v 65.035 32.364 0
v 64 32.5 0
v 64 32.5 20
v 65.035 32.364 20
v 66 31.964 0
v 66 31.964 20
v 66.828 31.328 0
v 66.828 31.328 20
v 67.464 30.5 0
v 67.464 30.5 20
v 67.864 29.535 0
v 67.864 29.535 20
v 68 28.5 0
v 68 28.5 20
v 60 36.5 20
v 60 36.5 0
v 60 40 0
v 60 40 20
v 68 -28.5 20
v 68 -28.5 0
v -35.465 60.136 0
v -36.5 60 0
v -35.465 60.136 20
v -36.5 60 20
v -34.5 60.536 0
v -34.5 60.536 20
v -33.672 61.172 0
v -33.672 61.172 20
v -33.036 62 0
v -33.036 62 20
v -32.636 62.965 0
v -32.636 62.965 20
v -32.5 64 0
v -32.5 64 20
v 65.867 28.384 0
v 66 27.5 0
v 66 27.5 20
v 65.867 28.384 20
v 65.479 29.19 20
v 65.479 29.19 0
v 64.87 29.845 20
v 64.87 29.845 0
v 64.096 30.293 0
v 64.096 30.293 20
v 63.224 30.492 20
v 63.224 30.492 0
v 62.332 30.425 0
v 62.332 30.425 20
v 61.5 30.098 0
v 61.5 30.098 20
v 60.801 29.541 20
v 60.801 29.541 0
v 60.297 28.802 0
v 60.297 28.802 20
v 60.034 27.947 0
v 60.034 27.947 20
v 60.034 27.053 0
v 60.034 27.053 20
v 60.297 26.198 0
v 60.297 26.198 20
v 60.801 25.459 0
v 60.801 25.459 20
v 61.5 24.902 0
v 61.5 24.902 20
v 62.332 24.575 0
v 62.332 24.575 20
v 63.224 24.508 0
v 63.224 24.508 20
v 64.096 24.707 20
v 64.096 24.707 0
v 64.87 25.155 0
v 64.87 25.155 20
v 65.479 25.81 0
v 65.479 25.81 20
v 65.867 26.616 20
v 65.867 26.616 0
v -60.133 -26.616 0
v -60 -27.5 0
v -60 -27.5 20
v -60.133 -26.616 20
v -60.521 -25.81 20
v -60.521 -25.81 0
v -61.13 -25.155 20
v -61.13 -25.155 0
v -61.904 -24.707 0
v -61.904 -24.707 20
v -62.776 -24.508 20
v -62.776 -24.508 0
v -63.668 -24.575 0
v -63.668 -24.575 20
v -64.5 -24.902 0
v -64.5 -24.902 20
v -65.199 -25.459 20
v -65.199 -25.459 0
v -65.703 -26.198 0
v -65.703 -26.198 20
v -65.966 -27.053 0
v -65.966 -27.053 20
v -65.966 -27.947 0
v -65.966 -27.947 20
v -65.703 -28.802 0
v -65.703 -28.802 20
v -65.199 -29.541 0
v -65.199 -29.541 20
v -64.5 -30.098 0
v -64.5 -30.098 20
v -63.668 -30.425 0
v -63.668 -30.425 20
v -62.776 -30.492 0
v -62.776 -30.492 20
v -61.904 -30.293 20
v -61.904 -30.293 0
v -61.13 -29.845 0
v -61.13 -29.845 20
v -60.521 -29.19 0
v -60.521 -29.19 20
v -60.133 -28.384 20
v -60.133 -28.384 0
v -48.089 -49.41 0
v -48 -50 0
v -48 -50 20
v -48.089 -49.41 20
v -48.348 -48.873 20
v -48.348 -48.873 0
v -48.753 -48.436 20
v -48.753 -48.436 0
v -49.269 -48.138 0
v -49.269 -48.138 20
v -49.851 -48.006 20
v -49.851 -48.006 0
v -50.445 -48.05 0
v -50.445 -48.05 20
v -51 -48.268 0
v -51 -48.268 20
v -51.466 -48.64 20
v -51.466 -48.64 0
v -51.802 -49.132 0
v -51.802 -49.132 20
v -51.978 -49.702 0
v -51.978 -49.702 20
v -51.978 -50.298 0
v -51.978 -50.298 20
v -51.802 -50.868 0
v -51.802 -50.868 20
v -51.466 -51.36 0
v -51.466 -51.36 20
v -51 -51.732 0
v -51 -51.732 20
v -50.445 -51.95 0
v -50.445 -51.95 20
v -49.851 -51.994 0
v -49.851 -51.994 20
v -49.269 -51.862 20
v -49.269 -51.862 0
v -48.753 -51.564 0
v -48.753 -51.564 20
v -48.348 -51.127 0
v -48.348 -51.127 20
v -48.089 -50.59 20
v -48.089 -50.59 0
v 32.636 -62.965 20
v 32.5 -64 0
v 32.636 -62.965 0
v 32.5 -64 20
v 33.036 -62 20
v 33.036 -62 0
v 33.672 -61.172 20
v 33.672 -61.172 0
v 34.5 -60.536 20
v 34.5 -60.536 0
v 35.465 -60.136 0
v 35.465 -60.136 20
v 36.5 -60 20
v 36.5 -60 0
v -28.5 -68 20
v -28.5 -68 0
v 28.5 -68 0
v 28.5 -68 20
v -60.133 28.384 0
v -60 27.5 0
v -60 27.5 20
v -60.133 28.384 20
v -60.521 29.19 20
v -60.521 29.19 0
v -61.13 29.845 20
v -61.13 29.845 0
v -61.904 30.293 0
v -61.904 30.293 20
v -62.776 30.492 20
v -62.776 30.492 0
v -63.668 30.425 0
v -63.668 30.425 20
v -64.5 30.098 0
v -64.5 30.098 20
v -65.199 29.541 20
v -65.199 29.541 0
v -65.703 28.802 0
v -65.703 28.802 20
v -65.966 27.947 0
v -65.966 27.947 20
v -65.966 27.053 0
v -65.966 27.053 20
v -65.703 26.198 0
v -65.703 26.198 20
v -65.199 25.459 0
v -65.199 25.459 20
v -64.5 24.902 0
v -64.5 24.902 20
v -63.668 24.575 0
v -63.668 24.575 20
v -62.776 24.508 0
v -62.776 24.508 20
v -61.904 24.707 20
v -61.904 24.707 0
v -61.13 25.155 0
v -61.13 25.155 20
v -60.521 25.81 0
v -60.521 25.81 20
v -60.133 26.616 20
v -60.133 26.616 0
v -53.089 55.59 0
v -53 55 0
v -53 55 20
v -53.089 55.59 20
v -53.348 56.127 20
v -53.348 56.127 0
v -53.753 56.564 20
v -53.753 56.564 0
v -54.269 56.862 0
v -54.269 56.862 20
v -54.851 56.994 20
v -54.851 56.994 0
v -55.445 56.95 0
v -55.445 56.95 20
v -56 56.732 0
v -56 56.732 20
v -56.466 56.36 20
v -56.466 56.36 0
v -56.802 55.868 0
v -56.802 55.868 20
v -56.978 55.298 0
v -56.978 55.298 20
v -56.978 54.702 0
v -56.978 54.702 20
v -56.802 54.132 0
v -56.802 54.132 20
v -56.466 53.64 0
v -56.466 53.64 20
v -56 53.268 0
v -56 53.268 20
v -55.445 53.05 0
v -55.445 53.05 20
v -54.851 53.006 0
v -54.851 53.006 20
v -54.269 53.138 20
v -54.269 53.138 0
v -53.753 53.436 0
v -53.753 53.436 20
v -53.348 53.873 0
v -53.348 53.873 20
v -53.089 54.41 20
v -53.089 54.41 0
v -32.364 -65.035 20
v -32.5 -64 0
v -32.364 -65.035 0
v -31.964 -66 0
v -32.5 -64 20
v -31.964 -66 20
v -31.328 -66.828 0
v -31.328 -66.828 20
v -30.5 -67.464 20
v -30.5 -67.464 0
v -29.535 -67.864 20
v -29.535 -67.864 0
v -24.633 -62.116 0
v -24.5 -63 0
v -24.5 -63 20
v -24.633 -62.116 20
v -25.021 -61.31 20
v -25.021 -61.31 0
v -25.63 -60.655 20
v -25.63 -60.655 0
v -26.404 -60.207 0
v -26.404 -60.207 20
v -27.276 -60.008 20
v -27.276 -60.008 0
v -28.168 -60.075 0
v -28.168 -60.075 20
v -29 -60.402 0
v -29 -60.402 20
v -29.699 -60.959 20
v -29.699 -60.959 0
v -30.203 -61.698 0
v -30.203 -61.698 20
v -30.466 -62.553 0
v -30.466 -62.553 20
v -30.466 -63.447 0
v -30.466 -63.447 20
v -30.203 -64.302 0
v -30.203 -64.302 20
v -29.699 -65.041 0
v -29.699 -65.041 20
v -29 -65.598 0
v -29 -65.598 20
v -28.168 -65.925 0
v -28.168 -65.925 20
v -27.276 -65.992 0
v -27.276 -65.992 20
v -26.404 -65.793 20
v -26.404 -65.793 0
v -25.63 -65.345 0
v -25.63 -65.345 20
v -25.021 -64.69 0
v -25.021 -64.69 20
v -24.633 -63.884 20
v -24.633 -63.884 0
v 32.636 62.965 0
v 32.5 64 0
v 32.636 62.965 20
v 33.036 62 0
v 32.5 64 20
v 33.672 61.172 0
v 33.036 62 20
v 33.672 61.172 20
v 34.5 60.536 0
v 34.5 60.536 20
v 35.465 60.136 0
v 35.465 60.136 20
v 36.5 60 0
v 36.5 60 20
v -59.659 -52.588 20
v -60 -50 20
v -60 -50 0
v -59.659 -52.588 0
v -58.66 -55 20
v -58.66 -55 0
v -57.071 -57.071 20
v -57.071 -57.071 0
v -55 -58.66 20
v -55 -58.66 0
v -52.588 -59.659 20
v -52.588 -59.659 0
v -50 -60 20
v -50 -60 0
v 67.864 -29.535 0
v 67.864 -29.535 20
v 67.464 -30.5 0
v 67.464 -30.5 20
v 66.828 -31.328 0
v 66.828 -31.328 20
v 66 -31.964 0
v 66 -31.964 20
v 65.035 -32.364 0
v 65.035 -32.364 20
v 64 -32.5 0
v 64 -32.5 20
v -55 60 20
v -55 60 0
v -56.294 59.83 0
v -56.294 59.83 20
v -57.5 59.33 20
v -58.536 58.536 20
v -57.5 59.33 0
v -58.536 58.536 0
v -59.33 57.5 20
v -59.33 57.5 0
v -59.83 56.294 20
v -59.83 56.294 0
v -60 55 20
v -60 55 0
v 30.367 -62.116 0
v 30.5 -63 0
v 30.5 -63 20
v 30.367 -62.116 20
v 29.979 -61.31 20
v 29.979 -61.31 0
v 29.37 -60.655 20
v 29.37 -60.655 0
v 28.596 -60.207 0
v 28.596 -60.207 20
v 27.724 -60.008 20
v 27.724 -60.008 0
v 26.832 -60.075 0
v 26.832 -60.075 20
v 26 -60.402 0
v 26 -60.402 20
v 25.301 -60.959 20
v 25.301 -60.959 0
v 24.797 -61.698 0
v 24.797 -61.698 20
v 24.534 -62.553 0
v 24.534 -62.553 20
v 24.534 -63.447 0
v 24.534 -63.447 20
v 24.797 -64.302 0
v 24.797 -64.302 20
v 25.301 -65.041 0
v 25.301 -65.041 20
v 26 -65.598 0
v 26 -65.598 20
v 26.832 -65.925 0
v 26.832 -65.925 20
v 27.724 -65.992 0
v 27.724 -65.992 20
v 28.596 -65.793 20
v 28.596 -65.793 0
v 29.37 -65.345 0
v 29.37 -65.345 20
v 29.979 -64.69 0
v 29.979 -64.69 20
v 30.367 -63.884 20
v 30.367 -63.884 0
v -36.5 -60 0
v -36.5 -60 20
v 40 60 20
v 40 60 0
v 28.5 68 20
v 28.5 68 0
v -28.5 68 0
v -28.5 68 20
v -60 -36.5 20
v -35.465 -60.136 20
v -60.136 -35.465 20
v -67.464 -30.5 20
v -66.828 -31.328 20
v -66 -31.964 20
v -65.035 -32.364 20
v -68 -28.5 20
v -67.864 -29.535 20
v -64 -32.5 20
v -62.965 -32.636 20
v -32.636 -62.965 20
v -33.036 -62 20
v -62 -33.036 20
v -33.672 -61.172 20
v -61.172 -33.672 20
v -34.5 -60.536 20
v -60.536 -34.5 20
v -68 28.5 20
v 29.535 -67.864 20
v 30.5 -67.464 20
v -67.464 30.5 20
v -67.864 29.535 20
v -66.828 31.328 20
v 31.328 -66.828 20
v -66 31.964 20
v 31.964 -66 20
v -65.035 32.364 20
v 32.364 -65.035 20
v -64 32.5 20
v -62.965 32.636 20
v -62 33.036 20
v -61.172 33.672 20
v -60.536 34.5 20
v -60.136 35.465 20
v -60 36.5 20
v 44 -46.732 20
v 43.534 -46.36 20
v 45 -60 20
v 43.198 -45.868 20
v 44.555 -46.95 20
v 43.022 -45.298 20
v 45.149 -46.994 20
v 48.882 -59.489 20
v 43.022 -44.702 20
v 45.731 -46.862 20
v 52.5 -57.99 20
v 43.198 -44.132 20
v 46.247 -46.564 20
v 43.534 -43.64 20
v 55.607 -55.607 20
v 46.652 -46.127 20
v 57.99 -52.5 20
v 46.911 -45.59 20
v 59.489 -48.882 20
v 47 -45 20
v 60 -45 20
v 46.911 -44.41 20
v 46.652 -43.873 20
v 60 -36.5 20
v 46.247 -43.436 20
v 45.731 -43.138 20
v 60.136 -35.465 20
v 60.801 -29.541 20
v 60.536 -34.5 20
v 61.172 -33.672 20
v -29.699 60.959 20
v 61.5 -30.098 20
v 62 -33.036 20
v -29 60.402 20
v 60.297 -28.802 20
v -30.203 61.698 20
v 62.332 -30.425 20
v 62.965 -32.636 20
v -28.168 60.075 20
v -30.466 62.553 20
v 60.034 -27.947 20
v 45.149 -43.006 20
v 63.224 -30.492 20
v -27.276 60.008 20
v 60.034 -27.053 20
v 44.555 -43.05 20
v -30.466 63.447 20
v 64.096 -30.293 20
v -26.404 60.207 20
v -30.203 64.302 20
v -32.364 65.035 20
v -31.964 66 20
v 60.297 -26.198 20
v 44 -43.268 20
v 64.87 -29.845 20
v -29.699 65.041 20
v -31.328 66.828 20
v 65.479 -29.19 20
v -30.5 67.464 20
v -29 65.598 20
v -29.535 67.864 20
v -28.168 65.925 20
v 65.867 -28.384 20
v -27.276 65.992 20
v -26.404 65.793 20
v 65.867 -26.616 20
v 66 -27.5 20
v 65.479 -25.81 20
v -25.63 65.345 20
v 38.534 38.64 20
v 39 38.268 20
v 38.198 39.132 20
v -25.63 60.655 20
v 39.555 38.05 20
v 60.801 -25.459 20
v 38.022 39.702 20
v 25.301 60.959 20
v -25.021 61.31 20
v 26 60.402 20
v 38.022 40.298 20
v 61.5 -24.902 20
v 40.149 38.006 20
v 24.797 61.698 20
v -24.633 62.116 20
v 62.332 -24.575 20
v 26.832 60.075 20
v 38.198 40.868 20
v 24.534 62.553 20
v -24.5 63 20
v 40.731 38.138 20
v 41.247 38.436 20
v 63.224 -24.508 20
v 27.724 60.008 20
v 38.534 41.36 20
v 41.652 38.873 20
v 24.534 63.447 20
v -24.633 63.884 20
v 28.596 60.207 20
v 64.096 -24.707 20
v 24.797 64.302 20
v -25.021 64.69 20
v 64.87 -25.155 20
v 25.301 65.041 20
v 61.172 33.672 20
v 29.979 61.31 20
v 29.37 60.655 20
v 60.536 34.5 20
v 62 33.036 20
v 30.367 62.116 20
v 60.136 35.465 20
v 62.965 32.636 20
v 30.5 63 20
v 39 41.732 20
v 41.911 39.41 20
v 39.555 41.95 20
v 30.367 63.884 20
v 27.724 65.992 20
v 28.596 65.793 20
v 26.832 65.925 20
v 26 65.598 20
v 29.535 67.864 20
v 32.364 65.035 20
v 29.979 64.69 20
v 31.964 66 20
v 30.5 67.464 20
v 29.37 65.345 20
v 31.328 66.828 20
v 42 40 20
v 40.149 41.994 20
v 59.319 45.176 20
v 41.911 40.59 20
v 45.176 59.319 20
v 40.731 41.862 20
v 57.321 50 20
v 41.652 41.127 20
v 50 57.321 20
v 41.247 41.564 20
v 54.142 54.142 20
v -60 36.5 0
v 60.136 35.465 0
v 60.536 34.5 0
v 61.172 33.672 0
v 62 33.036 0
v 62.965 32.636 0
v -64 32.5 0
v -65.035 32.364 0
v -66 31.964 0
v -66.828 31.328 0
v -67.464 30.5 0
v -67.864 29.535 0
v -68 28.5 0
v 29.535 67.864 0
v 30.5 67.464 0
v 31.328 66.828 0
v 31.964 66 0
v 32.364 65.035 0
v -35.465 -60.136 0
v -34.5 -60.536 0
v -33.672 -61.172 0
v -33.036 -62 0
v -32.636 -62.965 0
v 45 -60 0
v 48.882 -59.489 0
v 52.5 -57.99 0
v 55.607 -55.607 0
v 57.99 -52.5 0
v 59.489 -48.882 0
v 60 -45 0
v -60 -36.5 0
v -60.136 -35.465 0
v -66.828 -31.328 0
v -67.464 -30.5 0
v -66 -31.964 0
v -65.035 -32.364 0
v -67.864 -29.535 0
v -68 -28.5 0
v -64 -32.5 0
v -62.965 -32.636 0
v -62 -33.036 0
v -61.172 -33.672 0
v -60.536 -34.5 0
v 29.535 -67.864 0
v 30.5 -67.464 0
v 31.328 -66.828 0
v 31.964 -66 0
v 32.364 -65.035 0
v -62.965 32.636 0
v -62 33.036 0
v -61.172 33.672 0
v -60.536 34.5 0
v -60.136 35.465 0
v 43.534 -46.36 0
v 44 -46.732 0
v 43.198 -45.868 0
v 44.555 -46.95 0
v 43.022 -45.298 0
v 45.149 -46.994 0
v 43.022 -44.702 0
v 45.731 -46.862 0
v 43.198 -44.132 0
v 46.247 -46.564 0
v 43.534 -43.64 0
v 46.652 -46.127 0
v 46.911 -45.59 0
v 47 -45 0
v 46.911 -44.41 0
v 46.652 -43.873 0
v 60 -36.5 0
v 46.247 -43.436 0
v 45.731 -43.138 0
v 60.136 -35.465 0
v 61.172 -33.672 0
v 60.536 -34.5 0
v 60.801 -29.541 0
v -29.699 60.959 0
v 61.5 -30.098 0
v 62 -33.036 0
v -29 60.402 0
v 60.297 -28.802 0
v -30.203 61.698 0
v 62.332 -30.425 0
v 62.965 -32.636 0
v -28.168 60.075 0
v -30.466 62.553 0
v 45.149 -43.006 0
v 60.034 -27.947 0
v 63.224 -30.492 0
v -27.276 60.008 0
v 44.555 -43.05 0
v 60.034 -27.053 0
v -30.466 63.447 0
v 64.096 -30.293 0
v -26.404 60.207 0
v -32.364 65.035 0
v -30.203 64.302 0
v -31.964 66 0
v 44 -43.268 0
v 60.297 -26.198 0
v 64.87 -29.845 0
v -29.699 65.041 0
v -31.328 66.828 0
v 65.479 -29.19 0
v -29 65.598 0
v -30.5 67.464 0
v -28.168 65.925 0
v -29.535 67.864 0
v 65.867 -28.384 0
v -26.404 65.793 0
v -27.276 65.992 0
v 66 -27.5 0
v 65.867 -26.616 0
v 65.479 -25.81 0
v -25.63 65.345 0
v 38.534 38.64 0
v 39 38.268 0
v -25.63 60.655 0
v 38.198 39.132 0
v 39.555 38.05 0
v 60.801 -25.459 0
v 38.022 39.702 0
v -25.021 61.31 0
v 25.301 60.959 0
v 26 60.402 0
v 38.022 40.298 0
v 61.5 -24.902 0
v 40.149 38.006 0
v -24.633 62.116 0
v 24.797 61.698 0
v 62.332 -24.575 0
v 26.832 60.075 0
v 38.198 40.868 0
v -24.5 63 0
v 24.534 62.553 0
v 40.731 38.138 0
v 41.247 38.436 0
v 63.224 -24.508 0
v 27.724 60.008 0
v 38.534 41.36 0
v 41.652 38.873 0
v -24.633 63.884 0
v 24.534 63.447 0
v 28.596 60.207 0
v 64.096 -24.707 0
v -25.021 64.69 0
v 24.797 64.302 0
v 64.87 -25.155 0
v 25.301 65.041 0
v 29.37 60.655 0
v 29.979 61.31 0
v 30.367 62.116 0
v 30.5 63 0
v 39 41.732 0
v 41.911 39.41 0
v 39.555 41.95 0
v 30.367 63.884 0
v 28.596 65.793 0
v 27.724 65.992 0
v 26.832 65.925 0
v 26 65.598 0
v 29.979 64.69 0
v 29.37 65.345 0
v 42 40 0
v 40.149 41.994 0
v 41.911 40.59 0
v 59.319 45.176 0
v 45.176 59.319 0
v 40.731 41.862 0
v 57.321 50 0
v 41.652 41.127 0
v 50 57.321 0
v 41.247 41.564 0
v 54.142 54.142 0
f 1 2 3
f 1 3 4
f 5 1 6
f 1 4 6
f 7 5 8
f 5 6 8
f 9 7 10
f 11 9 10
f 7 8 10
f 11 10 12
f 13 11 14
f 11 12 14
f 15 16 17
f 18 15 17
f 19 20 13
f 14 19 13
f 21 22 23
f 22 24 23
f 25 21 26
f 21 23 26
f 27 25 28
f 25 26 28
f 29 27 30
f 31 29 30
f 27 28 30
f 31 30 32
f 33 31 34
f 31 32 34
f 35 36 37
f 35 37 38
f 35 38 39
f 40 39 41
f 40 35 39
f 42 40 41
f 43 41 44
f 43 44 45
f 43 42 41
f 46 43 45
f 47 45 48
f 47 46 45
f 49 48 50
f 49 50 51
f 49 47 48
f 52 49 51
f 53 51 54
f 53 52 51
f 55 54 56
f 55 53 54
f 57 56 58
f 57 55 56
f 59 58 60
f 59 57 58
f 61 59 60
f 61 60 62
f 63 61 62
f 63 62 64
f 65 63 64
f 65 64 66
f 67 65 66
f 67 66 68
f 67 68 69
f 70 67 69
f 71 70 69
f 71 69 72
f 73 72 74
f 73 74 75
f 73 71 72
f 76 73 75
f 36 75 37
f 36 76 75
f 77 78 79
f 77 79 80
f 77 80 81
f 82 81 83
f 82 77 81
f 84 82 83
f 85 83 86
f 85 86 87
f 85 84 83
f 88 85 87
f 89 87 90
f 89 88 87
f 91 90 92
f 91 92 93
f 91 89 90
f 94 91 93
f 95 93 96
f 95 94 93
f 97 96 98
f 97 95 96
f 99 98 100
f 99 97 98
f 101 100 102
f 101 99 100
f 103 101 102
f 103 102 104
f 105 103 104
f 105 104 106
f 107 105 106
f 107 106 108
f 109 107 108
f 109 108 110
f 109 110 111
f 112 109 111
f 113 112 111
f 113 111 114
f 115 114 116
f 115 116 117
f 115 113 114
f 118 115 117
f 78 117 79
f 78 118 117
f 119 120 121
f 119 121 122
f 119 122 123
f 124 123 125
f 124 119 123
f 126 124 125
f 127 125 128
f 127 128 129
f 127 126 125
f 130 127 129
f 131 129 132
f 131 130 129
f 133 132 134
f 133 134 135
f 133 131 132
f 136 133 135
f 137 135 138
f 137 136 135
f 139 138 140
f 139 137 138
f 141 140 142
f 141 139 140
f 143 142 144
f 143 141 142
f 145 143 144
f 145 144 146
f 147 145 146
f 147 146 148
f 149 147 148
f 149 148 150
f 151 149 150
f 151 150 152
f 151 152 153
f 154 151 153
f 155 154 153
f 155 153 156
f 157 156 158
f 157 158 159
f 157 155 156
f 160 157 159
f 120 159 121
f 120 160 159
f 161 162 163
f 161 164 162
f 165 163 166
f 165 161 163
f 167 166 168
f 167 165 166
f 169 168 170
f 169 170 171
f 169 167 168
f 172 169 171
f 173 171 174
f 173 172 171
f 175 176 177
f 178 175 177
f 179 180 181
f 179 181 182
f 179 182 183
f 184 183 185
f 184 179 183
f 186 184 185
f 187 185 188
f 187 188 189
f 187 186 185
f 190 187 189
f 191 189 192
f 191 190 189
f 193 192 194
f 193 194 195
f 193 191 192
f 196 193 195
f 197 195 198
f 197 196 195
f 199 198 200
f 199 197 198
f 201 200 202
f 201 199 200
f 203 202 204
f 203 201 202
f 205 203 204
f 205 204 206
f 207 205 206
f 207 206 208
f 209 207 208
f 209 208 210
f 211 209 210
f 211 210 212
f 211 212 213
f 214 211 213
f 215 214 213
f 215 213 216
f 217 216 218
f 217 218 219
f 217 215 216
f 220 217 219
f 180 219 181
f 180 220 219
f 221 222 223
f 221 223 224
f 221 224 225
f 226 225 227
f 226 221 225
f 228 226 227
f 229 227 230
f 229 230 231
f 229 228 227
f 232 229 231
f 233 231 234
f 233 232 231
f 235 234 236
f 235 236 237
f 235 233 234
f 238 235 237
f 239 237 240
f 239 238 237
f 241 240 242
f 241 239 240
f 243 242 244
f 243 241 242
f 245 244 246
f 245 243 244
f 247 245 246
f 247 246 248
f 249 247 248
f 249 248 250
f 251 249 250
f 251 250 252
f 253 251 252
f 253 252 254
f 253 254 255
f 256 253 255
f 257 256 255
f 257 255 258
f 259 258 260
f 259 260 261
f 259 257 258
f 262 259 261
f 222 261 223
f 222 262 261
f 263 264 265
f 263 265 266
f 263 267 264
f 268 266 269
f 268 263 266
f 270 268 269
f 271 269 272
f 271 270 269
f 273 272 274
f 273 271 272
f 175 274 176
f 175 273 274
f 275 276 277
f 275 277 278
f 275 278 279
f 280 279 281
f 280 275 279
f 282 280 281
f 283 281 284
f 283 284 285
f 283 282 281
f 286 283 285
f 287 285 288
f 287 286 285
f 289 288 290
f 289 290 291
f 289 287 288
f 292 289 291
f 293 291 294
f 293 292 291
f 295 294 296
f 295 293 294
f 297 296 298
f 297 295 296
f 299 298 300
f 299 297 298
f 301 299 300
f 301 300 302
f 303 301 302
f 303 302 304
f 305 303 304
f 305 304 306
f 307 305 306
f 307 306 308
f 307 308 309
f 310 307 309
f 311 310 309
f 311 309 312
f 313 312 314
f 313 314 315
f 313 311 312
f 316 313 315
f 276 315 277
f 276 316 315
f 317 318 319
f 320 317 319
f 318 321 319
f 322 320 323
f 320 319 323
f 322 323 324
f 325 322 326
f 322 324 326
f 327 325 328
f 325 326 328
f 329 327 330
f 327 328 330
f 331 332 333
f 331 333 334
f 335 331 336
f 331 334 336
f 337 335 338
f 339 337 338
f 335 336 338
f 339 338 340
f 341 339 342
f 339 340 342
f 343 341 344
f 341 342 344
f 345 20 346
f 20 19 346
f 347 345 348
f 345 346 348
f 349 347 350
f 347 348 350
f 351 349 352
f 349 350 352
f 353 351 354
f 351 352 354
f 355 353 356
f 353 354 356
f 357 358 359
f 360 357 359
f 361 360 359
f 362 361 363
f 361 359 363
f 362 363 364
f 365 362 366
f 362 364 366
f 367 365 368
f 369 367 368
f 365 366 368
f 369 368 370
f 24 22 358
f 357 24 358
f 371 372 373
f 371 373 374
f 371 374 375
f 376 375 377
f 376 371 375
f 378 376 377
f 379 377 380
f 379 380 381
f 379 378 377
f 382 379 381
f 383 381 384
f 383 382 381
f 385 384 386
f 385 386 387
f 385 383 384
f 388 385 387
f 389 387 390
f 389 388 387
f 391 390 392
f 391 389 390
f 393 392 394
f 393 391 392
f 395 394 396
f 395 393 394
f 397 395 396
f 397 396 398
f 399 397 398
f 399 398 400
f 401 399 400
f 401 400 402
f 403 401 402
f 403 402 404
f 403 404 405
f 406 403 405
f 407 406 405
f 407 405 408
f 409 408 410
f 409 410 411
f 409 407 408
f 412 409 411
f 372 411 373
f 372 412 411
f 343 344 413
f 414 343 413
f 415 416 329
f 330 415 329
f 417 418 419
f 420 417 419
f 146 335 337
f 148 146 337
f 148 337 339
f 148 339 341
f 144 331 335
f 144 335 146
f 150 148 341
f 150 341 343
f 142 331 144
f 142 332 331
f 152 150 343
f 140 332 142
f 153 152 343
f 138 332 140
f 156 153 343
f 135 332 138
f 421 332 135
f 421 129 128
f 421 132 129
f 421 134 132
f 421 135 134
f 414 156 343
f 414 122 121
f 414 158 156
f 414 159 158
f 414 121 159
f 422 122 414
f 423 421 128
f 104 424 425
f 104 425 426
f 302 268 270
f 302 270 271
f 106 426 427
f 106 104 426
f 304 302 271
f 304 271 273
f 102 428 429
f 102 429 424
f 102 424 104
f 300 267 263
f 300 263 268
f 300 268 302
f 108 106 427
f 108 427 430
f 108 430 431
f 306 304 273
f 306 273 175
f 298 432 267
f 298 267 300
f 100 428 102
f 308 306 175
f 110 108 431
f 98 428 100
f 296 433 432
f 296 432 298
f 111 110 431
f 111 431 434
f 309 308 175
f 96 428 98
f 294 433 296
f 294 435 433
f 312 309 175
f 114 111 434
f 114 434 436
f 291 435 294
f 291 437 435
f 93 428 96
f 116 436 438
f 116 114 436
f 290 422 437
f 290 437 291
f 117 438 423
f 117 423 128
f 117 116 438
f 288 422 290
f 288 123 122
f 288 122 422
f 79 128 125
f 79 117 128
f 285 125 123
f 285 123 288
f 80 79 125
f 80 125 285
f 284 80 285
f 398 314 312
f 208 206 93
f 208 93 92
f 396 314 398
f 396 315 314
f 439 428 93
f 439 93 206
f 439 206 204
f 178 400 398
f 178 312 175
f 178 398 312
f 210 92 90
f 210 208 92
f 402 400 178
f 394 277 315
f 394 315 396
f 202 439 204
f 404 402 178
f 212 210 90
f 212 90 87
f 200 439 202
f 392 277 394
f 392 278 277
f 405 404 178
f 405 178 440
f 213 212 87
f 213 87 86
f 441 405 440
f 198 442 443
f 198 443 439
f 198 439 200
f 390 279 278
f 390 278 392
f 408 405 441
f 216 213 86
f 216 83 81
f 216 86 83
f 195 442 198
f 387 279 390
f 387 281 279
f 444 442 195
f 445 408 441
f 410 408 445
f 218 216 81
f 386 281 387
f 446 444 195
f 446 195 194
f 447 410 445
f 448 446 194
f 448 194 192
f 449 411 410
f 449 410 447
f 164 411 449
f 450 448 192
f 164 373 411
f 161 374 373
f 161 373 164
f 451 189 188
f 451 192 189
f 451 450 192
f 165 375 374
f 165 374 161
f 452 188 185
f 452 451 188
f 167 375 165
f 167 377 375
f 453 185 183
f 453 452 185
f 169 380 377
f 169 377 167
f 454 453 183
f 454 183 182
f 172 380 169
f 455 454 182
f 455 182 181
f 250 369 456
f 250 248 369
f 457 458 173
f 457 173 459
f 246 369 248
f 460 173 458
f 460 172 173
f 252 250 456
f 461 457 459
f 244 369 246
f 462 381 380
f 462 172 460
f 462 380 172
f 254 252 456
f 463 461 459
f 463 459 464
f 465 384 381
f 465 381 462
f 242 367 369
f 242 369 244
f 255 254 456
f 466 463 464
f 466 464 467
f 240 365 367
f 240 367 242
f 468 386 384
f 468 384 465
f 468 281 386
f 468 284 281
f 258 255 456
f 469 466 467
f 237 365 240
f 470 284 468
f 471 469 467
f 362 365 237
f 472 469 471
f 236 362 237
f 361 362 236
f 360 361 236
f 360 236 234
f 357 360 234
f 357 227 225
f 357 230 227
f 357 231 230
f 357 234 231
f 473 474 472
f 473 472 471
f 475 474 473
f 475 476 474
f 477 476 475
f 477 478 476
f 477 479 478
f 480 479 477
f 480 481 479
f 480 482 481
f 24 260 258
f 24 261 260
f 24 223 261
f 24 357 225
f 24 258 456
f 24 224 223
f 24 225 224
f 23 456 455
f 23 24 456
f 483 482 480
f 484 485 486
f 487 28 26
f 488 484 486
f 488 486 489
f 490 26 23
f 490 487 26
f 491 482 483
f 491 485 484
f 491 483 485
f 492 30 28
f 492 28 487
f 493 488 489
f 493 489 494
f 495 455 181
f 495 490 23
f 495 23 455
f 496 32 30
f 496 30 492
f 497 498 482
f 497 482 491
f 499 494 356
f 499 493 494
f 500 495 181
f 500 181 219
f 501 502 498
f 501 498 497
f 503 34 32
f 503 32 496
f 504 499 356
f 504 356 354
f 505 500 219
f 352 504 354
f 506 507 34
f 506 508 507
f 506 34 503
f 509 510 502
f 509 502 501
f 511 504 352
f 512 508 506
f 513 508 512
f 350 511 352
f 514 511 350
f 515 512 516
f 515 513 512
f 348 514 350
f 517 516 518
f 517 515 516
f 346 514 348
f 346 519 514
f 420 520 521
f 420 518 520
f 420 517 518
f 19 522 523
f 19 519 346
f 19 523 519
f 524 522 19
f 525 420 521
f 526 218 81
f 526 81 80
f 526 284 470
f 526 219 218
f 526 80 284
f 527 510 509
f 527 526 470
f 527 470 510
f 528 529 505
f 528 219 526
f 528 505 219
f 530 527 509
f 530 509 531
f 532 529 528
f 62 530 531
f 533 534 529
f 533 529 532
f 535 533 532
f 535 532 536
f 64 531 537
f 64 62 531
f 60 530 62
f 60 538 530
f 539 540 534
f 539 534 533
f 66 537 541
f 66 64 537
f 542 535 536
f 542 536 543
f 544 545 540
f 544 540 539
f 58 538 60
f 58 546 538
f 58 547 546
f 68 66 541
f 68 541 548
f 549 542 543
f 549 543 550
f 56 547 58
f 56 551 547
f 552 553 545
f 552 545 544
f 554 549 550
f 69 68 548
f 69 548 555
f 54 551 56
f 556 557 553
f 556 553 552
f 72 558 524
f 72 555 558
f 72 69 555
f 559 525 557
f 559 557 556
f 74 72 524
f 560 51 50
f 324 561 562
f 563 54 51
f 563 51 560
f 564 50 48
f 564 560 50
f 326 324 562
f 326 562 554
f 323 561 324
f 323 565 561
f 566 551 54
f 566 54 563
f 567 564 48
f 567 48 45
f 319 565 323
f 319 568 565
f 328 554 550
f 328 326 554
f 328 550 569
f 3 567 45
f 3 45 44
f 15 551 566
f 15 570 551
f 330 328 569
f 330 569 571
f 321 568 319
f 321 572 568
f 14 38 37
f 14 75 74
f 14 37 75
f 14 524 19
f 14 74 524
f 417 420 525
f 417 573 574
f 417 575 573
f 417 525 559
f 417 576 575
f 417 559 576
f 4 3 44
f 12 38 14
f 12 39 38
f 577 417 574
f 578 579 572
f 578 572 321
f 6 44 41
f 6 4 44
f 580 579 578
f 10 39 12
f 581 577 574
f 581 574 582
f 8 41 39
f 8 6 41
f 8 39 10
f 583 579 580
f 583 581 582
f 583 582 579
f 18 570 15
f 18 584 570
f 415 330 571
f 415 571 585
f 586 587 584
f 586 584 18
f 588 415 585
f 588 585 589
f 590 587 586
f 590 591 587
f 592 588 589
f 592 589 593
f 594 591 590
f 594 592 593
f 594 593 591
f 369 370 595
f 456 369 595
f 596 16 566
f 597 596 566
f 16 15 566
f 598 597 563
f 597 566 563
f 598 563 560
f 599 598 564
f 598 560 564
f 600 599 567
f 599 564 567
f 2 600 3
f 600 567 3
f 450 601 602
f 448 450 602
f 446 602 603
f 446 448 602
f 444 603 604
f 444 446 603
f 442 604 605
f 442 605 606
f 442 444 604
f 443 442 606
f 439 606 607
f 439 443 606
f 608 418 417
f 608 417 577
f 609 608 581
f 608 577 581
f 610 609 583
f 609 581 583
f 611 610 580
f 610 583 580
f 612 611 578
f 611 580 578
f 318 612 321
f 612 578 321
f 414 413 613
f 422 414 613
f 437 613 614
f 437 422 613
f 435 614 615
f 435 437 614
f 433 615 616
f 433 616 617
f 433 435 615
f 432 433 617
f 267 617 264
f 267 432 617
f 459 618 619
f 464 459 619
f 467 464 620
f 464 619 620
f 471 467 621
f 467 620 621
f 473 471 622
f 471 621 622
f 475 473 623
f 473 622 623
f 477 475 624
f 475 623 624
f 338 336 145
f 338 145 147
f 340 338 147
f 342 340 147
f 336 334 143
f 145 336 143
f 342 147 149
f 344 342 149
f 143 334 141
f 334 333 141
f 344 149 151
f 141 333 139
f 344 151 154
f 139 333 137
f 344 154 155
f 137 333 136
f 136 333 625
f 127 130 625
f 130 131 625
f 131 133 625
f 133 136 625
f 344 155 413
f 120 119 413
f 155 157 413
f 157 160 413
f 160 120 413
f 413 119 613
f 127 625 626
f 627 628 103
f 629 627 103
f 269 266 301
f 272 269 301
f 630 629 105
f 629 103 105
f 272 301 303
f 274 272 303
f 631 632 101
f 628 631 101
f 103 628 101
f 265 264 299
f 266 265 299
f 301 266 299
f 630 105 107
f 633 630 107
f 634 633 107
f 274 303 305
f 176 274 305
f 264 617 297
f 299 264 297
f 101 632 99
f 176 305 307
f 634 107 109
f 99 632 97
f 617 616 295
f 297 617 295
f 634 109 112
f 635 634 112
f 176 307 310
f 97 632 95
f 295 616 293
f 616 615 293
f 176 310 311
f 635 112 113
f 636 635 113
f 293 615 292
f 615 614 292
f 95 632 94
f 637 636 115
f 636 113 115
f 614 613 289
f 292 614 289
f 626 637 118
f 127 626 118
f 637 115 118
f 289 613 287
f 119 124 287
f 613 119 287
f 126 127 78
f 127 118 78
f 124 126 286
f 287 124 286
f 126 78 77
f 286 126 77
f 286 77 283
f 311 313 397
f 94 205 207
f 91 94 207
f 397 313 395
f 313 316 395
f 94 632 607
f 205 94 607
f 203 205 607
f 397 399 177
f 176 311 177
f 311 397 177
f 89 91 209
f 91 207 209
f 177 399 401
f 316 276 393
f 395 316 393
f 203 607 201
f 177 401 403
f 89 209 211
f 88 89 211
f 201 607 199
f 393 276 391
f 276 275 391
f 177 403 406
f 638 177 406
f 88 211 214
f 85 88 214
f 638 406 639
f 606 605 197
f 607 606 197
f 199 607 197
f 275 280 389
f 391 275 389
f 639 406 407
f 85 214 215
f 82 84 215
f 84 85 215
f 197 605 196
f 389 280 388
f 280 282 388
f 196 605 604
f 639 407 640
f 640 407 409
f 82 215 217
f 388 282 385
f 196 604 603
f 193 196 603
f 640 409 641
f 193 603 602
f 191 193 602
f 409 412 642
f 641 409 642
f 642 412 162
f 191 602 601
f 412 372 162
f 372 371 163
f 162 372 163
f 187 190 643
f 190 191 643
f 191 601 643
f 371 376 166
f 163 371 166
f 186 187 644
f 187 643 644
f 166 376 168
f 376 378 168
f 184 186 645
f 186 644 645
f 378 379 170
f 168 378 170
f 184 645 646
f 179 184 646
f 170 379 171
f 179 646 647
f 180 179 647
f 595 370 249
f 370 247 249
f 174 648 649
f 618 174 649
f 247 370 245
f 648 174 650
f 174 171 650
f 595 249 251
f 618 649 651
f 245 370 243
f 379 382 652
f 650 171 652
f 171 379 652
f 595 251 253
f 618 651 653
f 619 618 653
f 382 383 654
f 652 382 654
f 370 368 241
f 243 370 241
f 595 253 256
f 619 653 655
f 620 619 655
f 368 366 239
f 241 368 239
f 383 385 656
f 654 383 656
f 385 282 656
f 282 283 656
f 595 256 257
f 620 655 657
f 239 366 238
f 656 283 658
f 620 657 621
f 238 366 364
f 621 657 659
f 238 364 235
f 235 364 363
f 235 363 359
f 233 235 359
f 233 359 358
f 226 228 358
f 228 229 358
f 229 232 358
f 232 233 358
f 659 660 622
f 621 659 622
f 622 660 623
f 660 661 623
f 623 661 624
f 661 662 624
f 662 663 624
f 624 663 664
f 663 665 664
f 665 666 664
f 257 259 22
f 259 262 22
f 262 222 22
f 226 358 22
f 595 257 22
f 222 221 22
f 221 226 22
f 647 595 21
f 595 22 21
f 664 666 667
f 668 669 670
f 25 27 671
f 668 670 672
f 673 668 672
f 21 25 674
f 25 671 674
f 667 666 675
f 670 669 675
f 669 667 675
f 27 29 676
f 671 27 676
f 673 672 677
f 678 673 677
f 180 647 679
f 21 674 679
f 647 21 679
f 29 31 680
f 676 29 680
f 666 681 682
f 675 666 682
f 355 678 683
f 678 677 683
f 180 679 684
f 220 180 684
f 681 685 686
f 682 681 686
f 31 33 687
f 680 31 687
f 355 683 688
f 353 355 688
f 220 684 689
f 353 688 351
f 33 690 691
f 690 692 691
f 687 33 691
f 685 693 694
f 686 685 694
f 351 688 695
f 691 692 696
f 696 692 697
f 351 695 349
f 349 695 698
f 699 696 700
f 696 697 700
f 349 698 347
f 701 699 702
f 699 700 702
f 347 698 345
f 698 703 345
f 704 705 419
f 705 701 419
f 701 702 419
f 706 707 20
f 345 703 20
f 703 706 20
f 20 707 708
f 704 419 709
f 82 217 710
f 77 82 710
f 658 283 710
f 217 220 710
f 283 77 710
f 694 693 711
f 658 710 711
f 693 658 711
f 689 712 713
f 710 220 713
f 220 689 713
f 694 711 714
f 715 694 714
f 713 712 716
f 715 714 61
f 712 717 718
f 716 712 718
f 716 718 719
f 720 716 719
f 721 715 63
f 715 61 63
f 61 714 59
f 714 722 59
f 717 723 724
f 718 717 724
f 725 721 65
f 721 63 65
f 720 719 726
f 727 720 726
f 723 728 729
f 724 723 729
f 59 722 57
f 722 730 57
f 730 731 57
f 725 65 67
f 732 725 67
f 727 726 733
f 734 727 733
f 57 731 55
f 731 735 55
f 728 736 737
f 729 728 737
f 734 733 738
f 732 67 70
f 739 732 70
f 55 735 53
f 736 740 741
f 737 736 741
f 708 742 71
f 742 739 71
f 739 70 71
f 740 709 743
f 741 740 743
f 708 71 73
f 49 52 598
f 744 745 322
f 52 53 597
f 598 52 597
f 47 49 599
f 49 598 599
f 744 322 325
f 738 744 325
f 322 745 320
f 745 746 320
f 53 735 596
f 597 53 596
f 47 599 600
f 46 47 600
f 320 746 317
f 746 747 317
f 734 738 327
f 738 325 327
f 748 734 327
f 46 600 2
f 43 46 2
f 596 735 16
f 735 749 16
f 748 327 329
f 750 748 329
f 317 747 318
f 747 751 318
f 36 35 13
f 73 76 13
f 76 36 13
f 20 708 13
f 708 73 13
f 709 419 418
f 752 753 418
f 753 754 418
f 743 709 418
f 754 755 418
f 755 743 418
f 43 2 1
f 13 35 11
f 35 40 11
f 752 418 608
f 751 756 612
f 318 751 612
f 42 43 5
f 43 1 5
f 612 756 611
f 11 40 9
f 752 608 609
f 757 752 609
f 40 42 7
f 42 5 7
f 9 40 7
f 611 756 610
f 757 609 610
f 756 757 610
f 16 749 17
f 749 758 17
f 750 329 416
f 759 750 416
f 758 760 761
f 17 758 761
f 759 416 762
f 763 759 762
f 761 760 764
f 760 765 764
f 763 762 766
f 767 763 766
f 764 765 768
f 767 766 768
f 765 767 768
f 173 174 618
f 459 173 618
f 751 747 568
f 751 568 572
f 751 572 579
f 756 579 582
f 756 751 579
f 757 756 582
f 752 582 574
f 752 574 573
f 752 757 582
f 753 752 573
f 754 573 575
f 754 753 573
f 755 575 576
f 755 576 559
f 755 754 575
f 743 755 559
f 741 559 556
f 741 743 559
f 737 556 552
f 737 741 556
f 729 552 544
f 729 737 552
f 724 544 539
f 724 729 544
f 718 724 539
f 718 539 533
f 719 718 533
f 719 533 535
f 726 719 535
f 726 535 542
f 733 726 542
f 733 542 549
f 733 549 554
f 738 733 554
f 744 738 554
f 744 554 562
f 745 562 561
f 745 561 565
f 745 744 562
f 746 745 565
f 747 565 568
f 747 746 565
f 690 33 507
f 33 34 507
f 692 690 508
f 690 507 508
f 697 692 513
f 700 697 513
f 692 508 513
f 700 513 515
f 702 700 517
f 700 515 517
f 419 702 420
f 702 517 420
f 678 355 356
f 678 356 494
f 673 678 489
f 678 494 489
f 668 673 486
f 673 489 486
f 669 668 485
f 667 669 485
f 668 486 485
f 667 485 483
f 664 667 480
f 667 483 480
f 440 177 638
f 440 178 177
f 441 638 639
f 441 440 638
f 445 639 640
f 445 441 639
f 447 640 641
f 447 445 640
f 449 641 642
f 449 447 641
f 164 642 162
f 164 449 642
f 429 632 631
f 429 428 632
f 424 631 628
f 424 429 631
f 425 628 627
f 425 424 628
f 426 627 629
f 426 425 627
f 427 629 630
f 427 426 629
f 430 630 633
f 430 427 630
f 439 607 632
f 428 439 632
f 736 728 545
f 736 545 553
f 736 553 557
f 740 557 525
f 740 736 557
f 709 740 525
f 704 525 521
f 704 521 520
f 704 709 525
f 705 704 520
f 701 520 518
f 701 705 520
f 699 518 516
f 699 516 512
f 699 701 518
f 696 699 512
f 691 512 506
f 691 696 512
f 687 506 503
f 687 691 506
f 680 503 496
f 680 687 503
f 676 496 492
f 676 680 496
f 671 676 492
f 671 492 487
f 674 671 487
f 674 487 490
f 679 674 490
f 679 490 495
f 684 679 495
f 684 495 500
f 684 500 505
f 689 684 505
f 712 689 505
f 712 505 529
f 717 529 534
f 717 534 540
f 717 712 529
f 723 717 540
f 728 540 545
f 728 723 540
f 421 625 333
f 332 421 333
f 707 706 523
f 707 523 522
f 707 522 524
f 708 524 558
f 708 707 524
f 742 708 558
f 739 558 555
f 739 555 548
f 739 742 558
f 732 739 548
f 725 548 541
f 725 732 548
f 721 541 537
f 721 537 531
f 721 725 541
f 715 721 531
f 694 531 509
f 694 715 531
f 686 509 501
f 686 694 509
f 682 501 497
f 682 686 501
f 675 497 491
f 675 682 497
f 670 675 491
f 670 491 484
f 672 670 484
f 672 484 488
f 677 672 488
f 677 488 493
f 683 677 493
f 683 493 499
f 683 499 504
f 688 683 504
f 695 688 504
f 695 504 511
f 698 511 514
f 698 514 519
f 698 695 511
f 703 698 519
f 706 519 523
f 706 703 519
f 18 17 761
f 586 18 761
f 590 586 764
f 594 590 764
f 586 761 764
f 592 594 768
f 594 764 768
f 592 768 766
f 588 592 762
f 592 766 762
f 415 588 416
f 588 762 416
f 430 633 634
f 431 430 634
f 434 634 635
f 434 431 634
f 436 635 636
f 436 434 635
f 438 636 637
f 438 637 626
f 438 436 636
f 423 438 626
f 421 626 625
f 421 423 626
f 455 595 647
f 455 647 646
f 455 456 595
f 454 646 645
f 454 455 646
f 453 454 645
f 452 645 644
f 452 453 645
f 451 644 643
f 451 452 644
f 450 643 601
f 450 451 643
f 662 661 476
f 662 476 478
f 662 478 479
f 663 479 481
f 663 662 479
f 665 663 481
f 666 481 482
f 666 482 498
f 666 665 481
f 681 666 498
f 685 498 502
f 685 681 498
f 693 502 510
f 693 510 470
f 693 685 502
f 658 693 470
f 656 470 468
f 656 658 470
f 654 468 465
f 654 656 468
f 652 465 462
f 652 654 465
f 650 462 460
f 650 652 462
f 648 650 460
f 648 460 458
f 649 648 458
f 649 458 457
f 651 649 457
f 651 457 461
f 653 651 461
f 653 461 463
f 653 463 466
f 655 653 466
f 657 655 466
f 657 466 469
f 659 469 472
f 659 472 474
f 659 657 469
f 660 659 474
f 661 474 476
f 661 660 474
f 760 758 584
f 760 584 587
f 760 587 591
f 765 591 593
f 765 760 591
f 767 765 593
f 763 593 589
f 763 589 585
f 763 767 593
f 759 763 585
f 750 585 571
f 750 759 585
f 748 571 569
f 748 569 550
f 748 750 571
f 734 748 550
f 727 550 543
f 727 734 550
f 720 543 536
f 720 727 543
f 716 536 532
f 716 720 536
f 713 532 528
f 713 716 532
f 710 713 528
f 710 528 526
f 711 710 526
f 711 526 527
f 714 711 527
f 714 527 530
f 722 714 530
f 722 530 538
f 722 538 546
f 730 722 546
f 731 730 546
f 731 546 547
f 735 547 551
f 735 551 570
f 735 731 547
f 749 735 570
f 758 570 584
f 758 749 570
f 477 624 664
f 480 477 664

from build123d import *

# Parameters (mm, degrees)
F0_R     = 2
F0_R_2   = 3
F1_DEPTH = 20
F2_R     = 3.99999


# Not quite as in the source:
# - a fillet or chamfer is up to 0.001 mm smaller than in the source, because OpenCascade refuses the exact size


with BuildPart() as f1:
    # F0 (on Top) → F1 (new body)
    with BuildSketch(Plane.XY):
        with BuildLine():
            Line((-32.5, 60), (-55, 60))
            ThreePointArc((-55, 60), (-58.5355339059, 58.5355339059), (-60, 55))
            Line((-60, 55), (-60, 32.5))
            Line((-60, 32.5), (-68, 32.5))
            Line((-68, 32.5), (-68, -32.5))
            Line((-68, -32.5), (-60, -32.5))
            Line((-60, -32.5), (-60, -50))
            ThreePointArc((-60, -50), (-57.0710678119, -57.0710678119), (-50, -60))
            Line((-50, -60), (-32.5, -60))
            Line((-32.5, -60), (-32.5, -68))
            Line((-32.5, -68), (32.5, -68))
            Line((32.5, -68), (32.5, -60))
            Line((32.5, -60), (45, -60))
            ThreePointArc((45, -60), (55.6066017178, -55.6066017178), (60, -45))
            Line((60, -45), (60, -32.5))
            Line((60, -32.5), (68, -32.5))
            Line((68, -32.5), (68, 32.5))
            Line((68, 32.5), (60, 32.5))
            Line((60, 32.5), (60, 40))
            ThreePointArc((60, 40), (54.1421356237, 54.1421356237), (40, 60))
            Line((40, 60), (32.5, 60))
            Line((32.5, 60), (32.5, 68))
            Line((32.5, 68), (-32.5, 68))
            Line((-32.5, 68), (-32.5, 60))
        make_face()
        with Locations((-50, -50)):
            Circle(F0_R, mode=Mode.SUBTRACT)
        with Locations((-27.5, -63)):
            Circle(F0_R_2, mode=Mode.SUBTRACT)
        with Locations((-63, -27.5)):
            Circle(F0_R_2, mode=Mode.SUBTRACT)
        with Locations((27.5, -63)):
            Circle(F0_R_2, mode=Mode.SUBTRACT)
        with Locations((45, -45)):
            Circle(F0_R, mode=Mode.SUBTRACT)
        with Locations((63, -27.5)):
            Circle(F0_R_2, mode=Mode.SUBTRACT)
        with Locations((-63, 27.5)):
            Circle(F0_R_2, mode=Mode.SUBTRACT)
        with Locations((-55, 55)):
            Circle(F0_R, mode=Mode.SUBTRACT)
        with Locations((-27.5, 63)):
            Circle(F0_R_2, mode=Mode.SUBTRACT)
        with Locations((63, 27.5)):
            Circle(F0_R_2, mode=Mode.SUBTRACT)
        with Locations((27.5, 63)):
            Circle(F0_R_2, mode=Mode.SUBTRACT)
        with Locations((40, 40)):
            Circle(F0_R, mode=Mode.SUBTRACT)
    extrude(amount=F1_DEPTH)

    # F2 (radius 4 in the source; OpenCascade refuses exactly that, so slightly less here)
    f2_edges = [f1.edges().sort_by_distance(p)[0] for p in [
        (-60, 32.5, 10),
        (-68, 32.5, 10),
        (-32.5, 60, 10),
        (-32.5, 68, 10),
        (32.5, 68, 10),
        (-68, -32.5, 10),
        (-32.5, -68, 10),
        (60, -32.5, 10),
        (68, -32.5, 10),
        (68, 32.5, 10),
        (32.5, -60, 10),
        (32.5, -68, 10),
        (-60, -32.5, 10),
        (-32.5, -60, 10),
        (60, 32.5, 10),
        (32.5, 60, 10),
    ]]
    fillet(f2_edges, radius=F2_R)


solid = f1.part
